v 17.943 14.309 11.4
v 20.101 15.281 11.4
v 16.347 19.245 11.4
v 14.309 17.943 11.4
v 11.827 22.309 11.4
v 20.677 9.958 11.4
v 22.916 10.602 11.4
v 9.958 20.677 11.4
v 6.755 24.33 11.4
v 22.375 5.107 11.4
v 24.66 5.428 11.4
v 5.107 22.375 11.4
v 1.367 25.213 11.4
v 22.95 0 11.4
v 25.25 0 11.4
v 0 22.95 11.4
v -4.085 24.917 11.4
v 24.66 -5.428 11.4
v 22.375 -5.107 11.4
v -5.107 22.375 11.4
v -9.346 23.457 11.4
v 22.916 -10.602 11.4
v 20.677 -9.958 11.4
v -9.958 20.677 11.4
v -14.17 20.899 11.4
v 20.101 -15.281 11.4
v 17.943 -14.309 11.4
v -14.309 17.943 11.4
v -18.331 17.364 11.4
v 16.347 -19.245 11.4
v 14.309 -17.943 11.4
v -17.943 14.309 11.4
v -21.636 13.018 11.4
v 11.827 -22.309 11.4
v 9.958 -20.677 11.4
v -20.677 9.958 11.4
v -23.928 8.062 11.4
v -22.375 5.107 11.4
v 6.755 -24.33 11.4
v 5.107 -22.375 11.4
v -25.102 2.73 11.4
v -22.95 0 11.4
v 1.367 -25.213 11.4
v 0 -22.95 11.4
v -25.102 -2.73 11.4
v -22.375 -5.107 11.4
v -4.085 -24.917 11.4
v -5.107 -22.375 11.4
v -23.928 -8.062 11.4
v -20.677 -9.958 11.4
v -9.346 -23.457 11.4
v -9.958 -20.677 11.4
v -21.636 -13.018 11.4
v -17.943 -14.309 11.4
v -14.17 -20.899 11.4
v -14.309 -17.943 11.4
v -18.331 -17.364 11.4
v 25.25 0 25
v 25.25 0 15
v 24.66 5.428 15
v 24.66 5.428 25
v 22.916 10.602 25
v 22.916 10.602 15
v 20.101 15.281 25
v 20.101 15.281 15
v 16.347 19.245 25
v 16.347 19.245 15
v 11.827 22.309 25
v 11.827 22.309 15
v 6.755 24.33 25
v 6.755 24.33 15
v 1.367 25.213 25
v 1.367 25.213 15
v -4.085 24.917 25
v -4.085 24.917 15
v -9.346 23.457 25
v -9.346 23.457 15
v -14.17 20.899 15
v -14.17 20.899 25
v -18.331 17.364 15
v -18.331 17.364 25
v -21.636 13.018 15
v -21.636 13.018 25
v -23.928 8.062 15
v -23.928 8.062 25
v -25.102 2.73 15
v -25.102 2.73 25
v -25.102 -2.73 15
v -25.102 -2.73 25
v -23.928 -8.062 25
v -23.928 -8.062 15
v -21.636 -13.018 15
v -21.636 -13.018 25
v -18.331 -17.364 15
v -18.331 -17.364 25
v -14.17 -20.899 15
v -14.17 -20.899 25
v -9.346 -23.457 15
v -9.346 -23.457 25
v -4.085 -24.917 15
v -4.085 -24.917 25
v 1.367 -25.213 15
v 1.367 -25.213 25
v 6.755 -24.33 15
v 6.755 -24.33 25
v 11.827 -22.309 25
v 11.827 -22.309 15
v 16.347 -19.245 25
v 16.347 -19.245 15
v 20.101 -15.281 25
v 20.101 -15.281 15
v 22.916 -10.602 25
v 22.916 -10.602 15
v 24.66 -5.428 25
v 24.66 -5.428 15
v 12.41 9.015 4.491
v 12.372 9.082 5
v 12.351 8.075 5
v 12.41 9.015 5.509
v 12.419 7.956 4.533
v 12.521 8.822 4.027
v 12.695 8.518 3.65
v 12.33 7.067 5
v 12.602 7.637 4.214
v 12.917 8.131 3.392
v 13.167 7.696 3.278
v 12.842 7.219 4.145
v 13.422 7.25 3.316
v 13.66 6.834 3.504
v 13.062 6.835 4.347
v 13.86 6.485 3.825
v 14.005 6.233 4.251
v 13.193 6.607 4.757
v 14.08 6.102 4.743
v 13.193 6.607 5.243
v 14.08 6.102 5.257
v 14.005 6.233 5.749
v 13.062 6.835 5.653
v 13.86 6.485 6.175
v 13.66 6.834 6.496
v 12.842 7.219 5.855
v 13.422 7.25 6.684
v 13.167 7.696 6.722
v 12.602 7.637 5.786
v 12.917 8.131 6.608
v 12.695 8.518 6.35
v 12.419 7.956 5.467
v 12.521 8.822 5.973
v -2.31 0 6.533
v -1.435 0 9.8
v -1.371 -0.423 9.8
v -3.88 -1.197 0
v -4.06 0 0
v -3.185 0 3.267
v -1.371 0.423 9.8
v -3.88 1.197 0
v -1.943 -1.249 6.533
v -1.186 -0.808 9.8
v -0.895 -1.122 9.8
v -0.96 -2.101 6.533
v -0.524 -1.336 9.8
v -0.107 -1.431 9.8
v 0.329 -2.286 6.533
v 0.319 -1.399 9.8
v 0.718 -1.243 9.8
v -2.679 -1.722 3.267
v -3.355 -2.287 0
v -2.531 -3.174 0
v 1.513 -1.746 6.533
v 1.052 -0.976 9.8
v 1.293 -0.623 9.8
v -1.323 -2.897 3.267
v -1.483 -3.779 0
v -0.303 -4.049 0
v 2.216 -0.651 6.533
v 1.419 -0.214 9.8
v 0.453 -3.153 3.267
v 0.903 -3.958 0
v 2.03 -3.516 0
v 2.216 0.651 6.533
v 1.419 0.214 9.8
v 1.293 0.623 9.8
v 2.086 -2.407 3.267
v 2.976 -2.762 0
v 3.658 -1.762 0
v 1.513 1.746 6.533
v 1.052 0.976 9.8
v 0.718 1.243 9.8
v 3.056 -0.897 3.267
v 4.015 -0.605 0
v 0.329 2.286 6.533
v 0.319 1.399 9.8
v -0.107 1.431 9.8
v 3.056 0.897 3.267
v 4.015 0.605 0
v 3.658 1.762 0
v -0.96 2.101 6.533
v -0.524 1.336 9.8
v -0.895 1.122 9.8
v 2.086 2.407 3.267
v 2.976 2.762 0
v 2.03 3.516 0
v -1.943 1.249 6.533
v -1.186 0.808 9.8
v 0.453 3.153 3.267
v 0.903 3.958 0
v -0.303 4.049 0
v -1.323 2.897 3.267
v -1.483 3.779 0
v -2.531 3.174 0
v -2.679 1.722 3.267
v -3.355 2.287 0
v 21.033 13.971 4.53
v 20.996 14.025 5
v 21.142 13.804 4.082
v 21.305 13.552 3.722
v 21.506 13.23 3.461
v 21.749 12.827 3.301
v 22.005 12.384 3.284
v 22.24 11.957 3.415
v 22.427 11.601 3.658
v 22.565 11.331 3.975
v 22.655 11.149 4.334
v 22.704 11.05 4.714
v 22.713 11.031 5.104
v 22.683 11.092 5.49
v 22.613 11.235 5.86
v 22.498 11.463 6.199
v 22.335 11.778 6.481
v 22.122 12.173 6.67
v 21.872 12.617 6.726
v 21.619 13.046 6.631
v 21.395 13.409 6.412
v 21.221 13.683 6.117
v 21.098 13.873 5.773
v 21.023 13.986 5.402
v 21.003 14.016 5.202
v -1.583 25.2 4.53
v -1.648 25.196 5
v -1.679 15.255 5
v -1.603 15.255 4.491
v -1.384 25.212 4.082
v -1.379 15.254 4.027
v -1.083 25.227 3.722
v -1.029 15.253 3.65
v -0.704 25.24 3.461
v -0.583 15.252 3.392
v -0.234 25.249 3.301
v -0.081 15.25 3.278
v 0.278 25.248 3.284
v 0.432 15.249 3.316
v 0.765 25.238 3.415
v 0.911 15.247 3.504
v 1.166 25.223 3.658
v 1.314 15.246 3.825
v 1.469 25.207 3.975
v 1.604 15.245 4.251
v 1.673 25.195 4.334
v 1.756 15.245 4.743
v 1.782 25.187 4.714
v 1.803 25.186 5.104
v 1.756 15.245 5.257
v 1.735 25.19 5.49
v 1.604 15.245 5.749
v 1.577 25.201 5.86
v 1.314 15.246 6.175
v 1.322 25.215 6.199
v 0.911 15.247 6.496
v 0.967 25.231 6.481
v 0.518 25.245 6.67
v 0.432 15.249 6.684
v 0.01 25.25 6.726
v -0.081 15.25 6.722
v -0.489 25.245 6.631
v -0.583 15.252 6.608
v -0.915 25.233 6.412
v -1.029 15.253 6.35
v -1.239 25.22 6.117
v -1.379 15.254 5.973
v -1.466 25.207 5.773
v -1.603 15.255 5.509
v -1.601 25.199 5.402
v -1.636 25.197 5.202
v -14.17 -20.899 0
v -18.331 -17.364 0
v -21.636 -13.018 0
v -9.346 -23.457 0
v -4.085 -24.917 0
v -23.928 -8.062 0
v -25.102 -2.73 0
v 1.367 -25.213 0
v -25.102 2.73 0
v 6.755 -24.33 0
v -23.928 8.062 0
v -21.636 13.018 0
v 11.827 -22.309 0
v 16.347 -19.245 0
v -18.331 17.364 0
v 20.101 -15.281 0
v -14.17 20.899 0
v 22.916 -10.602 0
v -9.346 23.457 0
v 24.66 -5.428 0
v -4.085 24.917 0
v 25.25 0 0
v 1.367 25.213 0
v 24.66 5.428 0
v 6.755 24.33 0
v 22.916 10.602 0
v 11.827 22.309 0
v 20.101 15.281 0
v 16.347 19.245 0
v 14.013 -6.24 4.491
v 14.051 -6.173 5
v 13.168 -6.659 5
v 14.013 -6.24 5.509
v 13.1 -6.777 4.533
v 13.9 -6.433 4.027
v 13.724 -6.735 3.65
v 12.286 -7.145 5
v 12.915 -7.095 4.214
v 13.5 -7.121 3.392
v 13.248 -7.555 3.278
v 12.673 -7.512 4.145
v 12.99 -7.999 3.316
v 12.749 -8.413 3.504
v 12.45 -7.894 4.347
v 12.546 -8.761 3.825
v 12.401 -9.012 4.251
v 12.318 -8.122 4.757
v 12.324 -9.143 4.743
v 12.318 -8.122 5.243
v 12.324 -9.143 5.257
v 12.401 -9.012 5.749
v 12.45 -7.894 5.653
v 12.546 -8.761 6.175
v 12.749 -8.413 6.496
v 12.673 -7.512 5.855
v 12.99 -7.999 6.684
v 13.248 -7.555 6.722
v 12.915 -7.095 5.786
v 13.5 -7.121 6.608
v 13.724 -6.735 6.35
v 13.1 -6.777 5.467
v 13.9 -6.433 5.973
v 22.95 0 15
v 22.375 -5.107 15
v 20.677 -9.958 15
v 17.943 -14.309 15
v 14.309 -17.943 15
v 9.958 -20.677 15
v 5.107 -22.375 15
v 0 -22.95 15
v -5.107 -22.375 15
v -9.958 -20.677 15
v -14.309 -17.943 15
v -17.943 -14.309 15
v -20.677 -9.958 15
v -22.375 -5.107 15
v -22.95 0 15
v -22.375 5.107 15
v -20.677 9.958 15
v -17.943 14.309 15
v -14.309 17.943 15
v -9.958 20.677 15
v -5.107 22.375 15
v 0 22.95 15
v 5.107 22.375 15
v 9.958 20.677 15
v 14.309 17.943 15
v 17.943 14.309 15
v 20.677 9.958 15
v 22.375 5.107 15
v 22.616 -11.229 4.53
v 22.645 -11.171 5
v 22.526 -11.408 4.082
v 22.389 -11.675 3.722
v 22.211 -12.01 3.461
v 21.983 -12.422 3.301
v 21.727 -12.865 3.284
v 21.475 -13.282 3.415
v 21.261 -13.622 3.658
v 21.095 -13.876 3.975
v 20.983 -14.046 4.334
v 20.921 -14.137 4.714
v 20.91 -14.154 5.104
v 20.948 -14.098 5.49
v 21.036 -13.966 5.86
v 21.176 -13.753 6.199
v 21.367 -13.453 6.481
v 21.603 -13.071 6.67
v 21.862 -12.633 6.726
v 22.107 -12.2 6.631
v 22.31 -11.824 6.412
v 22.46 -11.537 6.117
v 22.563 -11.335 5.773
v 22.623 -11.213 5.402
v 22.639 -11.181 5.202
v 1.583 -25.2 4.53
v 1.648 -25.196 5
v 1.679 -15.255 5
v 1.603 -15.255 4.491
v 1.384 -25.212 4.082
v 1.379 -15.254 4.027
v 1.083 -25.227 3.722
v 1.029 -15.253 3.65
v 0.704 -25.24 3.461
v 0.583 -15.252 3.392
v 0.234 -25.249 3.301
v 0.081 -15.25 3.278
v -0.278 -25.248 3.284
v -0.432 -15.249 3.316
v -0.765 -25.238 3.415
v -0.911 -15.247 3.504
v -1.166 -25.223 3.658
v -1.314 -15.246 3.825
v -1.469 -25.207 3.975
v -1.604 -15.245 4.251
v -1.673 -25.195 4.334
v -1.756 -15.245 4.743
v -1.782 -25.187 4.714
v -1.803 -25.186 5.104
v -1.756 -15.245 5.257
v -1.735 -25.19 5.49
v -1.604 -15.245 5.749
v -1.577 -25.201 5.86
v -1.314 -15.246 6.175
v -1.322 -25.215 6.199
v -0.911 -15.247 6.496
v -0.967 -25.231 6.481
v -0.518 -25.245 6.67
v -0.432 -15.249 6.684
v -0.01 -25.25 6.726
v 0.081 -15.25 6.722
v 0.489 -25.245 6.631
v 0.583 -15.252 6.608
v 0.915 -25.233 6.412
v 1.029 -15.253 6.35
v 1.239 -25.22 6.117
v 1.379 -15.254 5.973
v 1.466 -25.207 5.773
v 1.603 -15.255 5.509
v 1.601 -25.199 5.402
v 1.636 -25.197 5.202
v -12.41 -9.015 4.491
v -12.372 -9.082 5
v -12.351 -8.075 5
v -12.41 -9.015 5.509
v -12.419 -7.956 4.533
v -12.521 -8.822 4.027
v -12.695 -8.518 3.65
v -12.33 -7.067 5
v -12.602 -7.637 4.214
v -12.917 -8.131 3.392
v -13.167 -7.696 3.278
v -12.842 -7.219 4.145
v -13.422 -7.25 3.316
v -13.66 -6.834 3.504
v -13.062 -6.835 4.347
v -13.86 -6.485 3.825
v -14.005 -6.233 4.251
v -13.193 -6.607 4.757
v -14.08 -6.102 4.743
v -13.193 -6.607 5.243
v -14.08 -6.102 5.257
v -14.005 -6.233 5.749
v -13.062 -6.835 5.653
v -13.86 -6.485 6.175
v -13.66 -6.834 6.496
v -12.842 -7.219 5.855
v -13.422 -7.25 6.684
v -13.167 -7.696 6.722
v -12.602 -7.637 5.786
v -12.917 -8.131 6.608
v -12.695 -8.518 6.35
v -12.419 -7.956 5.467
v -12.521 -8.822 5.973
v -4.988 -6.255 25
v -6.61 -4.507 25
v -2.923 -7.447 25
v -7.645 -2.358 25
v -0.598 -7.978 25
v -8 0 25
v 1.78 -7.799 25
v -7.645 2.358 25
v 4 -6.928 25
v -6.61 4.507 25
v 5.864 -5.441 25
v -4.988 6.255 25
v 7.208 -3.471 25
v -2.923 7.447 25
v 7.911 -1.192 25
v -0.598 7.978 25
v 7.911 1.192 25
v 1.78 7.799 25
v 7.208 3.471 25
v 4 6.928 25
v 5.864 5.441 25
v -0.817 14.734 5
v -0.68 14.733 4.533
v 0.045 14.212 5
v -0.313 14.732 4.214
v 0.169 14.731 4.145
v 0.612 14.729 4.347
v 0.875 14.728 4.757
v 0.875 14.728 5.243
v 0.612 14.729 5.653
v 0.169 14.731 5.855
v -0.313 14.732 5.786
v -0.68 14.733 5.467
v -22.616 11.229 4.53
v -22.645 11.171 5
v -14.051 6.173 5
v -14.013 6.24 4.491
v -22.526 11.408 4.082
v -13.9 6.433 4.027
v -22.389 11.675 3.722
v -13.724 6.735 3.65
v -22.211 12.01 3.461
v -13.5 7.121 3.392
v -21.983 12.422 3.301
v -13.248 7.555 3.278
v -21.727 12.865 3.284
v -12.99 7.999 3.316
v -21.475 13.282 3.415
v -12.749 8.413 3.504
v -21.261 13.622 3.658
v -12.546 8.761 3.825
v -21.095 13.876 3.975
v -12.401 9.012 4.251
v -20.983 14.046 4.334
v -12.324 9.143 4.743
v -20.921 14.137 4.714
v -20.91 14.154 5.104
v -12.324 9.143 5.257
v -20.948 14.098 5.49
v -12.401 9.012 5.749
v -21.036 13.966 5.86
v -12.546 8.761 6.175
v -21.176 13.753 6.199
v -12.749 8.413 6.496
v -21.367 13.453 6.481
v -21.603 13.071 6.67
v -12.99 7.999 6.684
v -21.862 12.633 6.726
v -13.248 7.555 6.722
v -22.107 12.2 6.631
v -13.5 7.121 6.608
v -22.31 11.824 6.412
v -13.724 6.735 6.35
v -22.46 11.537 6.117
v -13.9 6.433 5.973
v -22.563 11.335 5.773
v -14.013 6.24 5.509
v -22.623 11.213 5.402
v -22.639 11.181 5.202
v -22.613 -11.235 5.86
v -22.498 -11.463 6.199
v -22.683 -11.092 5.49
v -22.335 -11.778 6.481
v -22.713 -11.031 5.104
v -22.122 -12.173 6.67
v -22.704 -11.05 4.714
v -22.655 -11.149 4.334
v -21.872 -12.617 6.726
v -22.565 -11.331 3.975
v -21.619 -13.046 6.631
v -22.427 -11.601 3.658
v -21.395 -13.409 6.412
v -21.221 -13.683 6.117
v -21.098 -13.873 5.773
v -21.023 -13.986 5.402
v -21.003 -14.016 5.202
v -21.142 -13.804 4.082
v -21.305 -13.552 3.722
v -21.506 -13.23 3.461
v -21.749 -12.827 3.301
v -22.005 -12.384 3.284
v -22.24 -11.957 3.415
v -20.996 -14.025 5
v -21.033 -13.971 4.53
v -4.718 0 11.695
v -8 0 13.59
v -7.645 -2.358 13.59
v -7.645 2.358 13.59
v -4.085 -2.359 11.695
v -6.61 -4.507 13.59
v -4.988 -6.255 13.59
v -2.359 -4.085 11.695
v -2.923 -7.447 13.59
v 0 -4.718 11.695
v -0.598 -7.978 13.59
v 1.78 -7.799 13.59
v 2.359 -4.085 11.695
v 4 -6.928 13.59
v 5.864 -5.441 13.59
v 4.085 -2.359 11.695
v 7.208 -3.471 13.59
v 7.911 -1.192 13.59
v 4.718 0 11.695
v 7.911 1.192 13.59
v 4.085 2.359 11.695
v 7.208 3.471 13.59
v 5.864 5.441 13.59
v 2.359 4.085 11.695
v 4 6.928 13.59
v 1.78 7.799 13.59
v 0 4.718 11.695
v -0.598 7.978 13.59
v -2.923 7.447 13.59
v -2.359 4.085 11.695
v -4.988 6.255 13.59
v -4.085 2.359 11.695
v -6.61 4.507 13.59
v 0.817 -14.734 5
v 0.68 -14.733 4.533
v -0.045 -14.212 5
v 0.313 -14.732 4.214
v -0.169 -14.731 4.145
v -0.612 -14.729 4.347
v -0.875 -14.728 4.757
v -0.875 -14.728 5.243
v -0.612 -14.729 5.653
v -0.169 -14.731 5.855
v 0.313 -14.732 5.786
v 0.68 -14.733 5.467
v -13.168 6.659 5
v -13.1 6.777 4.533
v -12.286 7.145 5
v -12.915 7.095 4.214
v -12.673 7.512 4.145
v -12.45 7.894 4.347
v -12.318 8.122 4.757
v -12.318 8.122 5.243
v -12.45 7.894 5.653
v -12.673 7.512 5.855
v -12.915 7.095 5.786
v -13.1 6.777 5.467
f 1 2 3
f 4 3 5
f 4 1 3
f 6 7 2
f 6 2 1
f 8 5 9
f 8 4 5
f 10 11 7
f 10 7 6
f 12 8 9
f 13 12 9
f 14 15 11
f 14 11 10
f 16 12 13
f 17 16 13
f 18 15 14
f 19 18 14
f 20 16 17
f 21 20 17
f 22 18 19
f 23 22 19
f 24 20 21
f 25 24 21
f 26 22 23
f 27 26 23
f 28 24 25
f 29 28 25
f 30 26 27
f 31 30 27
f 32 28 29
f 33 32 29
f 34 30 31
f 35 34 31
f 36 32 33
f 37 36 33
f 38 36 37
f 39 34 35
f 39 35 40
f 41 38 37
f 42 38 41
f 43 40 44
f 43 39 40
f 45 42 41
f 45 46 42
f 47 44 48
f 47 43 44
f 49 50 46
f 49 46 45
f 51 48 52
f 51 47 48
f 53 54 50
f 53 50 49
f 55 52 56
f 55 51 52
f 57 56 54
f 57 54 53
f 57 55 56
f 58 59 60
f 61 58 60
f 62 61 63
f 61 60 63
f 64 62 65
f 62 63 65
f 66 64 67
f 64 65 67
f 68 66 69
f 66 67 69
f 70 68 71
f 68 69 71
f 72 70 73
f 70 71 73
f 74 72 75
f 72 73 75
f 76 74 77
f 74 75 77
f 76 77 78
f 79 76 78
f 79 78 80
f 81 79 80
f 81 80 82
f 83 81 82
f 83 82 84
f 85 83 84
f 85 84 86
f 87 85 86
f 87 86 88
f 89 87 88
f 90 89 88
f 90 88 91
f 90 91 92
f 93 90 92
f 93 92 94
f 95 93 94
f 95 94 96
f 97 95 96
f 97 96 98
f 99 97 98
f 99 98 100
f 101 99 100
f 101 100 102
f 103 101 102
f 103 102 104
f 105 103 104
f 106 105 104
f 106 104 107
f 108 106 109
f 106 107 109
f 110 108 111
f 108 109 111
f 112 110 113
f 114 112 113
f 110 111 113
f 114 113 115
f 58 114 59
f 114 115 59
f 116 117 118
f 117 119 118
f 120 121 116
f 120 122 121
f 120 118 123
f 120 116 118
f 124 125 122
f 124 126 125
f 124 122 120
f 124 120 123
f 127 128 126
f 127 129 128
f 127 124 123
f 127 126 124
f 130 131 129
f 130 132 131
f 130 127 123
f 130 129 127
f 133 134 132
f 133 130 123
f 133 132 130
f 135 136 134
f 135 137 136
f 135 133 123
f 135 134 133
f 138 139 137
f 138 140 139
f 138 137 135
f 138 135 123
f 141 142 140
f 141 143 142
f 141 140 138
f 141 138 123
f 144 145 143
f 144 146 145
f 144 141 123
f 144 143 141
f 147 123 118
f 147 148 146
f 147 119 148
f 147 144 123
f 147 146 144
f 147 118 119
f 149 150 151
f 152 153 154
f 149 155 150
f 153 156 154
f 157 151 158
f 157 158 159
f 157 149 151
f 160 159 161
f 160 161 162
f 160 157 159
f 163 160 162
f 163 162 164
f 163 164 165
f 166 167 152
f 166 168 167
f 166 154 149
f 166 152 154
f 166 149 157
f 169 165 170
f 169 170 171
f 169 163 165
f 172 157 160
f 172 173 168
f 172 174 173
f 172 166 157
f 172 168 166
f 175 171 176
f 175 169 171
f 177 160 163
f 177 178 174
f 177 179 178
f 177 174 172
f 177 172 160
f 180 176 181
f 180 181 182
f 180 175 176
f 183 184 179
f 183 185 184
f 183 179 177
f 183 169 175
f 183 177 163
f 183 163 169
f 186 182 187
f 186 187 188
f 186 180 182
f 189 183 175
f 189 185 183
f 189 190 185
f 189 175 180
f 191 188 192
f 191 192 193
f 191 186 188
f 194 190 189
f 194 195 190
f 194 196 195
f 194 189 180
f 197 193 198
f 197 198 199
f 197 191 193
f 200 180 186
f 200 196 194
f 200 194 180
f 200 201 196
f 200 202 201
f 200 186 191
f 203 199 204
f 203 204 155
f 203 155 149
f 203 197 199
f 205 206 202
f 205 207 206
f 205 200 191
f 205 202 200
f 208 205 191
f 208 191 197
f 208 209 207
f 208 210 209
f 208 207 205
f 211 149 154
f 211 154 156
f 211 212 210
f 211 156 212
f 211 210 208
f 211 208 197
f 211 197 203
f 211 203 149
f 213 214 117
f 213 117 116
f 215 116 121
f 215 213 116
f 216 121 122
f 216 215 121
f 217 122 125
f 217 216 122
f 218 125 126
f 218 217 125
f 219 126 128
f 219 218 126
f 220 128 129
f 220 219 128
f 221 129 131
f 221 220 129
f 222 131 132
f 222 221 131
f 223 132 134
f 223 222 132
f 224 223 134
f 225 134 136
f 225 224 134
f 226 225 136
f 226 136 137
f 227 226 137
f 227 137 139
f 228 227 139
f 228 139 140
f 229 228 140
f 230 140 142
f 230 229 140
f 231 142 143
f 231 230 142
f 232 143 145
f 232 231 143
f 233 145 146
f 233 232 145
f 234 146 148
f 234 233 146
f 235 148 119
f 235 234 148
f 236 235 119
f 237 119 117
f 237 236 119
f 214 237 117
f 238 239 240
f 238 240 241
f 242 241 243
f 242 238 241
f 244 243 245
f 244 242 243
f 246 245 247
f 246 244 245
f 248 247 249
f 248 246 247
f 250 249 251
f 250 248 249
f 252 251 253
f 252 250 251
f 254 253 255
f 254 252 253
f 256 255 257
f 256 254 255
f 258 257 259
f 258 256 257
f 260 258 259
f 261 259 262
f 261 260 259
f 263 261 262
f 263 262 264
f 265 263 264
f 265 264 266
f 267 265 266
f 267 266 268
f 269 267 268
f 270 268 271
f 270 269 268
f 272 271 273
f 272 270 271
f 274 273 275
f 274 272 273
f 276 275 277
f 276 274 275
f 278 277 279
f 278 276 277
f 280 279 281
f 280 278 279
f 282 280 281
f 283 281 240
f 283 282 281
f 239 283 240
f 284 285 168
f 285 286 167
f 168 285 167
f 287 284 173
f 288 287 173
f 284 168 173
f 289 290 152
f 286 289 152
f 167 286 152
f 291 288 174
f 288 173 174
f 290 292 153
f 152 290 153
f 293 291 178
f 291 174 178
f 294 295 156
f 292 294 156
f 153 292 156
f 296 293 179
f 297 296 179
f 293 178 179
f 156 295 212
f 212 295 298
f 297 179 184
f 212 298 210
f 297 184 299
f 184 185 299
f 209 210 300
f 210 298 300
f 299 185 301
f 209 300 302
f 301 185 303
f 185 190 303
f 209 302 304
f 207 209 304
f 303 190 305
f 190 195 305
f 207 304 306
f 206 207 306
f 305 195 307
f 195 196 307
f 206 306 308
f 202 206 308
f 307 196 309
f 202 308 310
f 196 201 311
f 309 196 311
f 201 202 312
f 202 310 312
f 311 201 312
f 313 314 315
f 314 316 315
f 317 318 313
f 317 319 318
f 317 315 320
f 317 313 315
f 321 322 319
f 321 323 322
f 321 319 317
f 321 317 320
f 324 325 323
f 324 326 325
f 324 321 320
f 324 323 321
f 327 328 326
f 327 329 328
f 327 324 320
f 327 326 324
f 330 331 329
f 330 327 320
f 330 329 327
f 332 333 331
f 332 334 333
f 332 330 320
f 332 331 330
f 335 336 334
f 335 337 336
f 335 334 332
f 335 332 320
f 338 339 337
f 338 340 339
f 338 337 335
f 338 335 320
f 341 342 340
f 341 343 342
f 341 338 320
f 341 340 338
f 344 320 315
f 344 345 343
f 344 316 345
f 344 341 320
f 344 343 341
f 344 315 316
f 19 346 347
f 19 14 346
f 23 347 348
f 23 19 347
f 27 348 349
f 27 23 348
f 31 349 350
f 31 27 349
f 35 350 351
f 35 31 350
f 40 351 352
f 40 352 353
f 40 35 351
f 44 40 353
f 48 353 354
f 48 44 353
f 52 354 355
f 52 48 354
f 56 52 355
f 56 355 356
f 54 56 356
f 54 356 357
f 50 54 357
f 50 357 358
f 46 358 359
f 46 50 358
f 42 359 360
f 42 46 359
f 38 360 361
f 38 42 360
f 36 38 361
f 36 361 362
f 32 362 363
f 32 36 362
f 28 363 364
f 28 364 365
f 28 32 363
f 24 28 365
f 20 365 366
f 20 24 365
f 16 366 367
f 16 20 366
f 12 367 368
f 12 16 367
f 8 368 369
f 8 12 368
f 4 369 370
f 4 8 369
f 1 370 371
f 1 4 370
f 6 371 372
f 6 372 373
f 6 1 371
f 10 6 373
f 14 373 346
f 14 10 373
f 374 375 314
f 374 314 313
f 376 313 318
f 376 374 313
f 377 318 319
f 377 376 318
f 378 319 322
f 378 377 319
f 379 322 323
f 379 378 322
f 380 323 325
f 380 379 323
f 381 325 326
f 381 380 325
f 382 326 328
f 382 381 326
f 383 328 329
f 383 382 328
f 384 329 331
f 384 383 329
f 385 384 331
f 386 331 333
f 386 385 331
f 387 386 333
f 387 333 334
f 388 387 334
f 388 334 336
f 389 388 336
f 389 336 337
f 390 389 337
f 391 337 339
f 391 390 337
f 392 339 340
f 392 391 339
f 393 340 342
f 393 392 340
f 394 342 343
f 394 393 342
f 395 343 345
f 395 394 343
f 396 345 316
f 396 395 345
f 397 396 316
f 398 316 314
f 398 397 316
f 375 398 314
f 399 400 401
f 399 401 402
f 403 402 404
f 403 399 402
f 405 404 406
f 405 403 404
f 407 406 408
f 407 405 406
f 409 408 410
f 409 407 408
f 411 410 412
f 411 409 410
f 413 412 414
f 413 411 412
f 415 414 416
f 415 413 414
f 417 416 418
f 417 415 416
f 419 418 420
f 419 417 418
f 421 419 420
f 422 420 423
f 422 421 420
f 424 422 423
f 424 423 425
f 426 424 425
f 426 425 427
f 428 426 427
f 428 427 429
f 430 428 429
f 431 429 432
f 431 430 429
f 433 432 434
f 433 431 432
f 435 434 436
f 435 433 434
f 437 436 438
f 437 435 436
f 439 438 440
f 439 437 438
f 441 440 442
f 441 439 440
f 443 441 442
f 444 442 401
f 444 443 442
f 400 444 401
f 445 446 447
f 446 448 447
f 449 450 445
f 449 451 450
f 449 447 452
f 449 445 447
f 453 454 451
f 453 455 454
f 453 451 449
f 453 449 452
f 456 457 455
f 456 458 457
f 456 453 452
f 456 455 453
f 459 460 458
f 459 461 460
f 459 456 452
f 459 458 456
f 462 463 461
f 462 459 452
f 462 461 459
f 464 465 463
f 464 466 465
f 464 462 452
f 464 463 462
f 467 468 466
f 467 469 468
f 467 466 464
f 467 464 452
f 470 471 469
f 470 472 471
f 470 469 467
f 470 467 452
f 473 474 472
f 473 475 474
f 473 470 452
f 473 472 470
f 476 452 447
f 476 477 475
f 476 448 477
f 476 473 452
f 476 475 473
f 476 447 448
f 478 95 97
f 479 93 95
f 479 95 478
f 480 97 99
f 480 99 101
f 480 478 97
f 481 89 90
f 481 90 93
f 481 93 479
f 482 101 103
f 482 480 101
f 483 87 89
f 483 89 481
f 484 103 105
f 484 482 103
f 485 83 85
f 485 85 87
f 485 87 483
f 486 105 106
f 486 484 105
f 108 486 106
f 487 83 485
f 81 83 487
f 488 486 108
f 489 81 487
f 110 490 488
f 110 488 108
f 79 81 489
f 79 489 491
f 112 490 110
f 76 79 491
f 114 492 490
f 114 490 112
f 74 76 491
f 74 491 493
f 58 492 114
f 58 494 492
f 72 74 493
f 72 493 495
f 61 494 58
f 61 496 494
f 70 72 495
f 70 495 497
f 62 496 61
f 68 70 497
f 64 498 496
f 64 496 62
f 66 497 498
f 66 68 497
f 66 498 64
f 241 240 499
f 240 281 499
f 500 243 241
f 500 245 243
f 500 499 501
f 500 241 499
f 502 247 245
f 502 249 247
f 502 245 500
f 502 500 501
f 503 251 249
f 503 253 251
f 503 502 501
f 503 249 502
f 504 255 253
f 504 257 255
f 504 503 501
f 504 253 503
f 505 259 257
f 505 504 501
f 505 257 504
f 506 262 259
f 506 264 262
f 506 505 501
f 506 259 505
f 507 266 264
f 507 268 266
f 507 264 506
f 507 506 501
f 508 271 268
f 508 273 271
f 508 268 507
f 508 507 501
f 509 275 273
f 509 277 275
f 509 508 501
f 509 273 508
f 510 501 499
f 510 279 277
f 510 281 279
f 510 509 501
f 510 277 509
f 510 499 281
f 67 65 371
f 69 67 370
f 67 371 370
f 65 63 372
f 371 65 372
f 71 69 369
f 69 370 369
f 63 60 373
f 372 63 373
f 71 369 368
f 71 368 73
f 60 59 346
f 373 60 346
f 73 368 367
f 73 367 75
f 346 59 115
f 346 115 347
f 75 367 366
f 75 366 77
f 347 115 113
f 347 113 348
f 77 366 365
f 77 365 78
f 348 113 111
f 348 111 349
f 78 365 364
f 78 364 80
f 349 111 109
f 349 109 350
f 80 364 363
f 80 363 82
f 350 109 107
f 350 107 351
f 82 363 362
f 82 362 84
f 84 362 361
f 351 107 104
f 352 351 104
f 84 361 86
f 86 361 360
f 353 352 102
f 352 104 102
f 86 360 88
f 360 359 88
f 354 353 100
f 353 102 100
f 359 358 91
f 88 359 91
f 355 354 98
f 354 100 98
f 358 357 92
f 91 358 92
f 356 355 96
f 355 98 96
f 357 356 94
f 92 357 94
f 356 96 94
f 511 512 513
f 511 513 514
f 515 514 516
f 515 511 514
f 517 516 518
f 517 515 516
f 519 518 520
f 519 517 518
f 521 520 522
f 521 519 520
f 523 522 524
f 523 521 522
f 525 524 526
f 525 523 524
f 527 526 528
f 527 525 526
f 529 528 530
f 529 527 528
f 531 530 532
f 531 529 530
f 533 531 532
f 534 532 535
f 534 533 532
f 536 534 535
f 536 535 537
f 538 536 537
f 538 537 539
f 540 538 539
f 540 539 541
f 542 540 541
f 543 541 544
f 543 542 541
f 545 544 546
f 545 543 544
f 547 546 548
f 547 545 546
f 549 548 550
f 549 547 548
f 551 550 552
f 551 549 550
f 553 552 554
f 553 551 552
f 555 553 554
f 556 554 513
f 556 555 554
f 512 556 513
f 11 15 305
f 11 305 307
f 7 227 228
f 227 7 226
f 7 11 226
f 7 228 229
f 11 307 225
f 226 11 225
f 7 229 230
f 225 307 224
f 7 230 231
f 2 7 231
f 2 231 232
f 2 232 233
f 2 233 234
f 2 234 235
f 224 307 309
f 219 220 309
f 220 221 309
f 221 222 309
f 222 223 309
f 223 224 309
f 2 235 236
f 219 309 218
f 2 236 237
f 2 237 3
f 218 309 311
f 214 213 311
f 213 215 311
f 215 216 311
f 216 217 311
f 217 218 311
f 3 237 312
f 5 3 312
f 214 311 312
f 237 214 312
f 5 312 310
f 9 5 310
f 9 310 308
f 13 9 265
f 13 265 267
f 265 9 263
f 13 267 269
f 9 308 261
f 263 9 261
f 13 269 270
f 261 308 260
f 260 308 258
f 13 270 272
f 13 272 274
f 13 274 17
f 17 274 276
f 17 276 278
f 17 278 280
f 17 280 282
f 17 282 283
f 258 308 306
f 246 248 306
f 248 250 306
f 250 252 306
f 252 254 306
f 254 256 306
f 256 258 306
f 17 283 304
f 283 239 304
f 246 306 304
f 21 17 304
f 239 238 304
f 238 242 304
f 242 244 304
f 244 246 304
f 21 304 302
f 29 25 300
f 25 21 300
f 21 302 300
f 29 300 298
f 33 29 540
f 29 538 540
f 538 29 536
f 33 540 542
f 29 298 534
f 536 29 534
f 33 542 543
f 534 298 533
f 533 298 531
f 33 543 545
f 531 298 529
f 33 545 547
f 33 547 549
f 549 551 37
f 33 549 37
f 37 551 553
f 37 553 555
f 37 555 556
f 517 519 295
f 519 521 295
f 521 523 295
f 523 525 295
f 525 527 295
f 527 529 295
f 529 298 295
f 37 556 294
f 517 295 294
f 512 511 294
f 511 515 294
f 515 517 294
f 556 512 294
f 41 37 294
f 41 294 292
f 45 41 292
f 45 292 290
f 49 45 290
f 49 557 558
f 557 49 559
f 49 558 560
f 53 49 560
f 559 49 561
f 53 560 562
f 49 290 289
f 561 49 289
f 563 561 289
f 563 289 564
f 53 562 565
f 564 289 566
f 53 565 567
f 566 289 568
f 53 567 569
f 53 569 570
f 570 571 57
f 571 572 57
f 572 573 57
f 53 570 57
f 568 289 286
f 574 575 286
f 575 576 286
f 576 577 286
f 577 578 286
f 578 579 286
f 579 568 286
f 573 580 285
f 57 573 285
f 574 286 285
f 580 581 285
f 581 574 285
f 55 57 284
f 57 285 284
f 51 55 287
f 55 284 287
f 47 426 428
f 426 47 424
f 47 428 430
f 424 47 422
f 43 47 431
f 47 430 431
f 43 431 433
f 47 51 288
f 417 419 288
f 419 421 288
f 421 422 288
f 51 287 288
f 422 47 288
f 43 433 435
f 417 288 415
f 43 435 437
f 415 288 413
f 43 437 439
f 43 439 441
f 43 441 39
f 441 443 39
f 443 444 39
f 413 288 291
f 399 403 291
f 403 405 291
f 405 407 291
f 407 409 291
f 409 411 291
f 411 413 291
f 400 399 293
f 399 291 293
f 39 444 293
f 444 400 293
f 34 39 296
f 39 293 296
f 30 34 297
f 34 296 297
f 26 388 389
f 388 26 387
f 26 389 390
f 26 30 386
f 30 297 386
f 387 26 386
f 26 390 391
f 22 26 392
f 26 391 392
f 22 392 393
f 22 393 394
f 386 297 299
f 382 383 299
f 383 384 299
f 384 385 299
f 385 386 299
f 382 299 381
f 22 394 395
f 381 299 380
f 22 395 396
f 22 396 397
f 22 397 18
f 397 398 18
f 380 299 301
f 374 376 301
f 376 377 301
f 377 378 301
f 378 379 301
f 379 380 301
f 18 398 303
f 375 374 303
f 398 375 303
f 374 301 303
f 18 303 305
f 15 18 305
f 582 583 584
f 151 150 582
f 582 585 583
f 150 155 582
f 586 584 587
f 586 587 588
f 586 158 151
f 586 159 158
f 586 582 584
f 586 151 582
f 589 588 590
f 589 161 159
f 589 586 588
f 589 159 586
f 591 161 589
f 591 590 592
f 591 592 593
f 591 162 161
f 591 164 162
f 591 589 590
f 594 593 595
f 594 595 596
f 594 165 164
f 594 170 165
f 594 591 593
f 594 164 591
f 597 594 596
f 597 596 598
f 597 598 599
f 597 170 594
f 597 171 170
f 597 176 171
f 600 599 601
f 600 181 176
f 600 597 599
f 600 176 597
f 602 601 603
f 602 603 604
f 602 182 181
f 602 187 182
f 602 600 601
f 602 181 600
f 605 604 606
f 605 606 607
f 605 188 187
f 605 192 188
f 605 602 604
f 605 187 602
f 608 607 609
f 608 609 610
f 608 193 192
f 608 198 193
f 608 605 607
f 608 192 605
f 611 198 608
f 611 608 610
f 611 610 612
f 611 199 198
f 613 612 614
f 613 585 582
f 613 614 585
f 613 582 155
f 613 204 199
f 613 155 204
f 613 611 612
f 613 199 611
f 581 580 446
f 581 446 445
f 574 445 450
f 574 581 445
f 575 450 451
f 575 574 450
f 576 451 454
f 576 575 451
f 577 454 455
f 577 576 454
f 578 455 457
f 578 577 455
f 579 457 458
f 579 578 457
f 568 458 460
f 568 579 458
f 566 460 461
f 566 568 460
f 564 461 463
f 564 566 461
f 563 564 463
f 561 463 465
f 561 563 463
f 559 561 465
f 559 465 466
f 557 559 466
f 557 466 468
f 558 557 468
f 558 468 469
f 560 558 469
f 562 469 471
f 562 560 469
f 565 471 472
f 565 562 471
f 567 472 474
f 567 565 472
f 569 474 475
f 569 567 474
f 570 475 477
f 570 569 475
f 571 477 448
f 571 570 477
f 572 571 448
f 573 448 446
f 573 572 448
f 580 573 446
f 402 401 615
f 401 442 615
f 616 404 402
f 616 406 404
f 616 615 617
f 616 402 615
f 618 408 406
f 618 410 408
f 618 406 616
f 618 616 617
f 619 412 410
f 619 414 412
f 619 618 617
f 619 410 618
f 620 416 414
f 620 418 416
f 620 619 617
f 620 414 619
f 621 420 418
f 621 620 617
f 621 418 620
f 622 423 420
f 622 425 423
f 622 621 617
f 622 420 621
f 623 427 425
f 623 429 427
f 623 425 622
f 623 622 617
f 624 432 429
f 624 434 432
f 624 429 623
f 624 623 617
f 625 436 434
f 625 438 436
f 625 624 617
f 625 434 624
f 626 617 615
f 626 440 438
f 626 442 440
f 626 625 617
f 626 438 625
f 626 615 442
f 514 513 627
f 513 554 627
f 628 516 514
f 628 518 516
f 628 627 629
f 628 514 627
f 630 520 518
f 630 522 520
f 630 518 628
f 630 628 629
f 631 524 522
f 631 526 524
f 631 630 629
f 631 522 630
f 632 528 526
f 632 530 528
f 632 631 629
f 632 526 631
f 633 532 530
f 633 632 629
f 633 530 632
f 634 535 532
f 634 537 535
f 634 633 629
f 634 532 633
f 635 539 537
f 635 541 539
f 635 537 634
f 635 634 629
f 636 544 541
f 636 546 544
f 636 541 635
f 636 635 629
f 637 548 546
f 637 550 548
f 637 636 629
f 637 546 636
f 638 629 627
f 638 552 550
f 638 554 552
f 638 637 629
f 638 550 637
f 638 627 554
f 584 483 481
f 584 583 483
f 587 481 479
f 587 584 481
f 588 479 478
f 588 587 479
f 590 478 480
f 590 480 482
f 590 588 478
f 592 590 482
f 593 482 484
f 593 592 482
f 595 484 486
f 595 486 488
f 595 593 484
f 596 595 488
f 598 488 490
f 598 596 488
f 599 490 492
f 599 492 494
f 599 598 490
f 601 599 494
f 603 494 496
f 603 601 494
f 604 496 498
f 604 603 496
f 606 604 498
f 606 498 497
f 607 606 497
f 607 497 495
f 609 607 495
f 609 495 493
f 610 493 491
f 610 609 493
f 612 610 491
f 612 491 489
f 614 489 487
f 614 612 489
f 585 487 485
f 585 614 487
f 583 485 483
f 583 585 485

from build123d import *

# Parameters (mm, degrees)
SKETCH2_R           = 25.25
BOSS_EXTRUDE1_DEPTH = 25
SKETCH8_W           = 3.6
SKETCH8_H           = 2.3
CIRPATTERN1_COUNT   = 6


with BuildPart() as part:
    # Sketch2 → Boss-Extrude1 (new body)
    with BuildSketch(Plane.XY):
        Circle(SKETCH2_R)
    extrude(amount=BOSS_EXTRUDE1_DEPTH)

    # Sketch6 → Cut-Revolve2 (revolve, cut)
    with BuildSketch(Plane(origin=(0, 0, 0), x_dir=(0, 0, -1), z_dir=(1, 0, 0)), mode=Mode.PRIVATE) as cut_revolve2_sk:
        Polygon((-25, 0), (-25, 8), (-13.59, 8), (-9.799695483, 1.435), (0, 4.06), (0, 0), align=None)
    revolve(cut_revolve2_sk.sketch.rotate(Axis((0, 0, 0), (0, 0, 1)), 90), axis=Axis((0, 0, 0), (0, 0, 1)), mode=Mode.SUBTRACT)

    # Sketch8 → Cut-Revolve3 (revolve, cut)
    with BuildSketch(Plane(origin=(0, 0, 0), x_dir=(0, 0, -1), z_dir=(1, 0, 0)), mode=Mode.PRIVATE) as cut_revolve3_sk:
        with Locations((-13.2, 24.1)):
            Rectangle(SKETCH8_W, SKETCH8_H)
    revolve(cut_revolve3_sk.sketch.rotate(Axis((0, 0, 25), (0, 0, -1)), 90), axis=Axis((0, 0, 25), (0, 0, -1)), mode=Mode.SUBTRACT)

    # Sketch9 → #8-32 Tapped Hole1 (revolve, cut)
    with BuildSketch(Plane(origin=(0.079165003, 25.249875899, 5), x_dir=(-0.9999950850990496, 0.003135247636910079, 0), z_dir=(0, 0, 1))):
        Polygon((0, 0), (0, 11.037806461), (1.7272, 10), (1.7272, 0), align=None)
    f_8_32_tapped_hole1 = revolve(axis=Axis((0.099073825, 31.599844689, 5), (-0.0031352476369100784, -0.9999950850990494, 0)), mode=Mode.SUBTRACT)

    # CirPattern1: #8-32 Tapped Hole1 ×6 about axis
    cirpattern1_axis = Axis((0, 0, 25), (0, 0, -1))
    for i in range(1, CIRPATTERN1_COUNT):
        add(f_8_32_tapped_hole1.rotate(cirpattern1_axis, i * 360 / CIRPATTERN1_COUNT), mode=Mode.SUBTRACT)


solid = part.part
